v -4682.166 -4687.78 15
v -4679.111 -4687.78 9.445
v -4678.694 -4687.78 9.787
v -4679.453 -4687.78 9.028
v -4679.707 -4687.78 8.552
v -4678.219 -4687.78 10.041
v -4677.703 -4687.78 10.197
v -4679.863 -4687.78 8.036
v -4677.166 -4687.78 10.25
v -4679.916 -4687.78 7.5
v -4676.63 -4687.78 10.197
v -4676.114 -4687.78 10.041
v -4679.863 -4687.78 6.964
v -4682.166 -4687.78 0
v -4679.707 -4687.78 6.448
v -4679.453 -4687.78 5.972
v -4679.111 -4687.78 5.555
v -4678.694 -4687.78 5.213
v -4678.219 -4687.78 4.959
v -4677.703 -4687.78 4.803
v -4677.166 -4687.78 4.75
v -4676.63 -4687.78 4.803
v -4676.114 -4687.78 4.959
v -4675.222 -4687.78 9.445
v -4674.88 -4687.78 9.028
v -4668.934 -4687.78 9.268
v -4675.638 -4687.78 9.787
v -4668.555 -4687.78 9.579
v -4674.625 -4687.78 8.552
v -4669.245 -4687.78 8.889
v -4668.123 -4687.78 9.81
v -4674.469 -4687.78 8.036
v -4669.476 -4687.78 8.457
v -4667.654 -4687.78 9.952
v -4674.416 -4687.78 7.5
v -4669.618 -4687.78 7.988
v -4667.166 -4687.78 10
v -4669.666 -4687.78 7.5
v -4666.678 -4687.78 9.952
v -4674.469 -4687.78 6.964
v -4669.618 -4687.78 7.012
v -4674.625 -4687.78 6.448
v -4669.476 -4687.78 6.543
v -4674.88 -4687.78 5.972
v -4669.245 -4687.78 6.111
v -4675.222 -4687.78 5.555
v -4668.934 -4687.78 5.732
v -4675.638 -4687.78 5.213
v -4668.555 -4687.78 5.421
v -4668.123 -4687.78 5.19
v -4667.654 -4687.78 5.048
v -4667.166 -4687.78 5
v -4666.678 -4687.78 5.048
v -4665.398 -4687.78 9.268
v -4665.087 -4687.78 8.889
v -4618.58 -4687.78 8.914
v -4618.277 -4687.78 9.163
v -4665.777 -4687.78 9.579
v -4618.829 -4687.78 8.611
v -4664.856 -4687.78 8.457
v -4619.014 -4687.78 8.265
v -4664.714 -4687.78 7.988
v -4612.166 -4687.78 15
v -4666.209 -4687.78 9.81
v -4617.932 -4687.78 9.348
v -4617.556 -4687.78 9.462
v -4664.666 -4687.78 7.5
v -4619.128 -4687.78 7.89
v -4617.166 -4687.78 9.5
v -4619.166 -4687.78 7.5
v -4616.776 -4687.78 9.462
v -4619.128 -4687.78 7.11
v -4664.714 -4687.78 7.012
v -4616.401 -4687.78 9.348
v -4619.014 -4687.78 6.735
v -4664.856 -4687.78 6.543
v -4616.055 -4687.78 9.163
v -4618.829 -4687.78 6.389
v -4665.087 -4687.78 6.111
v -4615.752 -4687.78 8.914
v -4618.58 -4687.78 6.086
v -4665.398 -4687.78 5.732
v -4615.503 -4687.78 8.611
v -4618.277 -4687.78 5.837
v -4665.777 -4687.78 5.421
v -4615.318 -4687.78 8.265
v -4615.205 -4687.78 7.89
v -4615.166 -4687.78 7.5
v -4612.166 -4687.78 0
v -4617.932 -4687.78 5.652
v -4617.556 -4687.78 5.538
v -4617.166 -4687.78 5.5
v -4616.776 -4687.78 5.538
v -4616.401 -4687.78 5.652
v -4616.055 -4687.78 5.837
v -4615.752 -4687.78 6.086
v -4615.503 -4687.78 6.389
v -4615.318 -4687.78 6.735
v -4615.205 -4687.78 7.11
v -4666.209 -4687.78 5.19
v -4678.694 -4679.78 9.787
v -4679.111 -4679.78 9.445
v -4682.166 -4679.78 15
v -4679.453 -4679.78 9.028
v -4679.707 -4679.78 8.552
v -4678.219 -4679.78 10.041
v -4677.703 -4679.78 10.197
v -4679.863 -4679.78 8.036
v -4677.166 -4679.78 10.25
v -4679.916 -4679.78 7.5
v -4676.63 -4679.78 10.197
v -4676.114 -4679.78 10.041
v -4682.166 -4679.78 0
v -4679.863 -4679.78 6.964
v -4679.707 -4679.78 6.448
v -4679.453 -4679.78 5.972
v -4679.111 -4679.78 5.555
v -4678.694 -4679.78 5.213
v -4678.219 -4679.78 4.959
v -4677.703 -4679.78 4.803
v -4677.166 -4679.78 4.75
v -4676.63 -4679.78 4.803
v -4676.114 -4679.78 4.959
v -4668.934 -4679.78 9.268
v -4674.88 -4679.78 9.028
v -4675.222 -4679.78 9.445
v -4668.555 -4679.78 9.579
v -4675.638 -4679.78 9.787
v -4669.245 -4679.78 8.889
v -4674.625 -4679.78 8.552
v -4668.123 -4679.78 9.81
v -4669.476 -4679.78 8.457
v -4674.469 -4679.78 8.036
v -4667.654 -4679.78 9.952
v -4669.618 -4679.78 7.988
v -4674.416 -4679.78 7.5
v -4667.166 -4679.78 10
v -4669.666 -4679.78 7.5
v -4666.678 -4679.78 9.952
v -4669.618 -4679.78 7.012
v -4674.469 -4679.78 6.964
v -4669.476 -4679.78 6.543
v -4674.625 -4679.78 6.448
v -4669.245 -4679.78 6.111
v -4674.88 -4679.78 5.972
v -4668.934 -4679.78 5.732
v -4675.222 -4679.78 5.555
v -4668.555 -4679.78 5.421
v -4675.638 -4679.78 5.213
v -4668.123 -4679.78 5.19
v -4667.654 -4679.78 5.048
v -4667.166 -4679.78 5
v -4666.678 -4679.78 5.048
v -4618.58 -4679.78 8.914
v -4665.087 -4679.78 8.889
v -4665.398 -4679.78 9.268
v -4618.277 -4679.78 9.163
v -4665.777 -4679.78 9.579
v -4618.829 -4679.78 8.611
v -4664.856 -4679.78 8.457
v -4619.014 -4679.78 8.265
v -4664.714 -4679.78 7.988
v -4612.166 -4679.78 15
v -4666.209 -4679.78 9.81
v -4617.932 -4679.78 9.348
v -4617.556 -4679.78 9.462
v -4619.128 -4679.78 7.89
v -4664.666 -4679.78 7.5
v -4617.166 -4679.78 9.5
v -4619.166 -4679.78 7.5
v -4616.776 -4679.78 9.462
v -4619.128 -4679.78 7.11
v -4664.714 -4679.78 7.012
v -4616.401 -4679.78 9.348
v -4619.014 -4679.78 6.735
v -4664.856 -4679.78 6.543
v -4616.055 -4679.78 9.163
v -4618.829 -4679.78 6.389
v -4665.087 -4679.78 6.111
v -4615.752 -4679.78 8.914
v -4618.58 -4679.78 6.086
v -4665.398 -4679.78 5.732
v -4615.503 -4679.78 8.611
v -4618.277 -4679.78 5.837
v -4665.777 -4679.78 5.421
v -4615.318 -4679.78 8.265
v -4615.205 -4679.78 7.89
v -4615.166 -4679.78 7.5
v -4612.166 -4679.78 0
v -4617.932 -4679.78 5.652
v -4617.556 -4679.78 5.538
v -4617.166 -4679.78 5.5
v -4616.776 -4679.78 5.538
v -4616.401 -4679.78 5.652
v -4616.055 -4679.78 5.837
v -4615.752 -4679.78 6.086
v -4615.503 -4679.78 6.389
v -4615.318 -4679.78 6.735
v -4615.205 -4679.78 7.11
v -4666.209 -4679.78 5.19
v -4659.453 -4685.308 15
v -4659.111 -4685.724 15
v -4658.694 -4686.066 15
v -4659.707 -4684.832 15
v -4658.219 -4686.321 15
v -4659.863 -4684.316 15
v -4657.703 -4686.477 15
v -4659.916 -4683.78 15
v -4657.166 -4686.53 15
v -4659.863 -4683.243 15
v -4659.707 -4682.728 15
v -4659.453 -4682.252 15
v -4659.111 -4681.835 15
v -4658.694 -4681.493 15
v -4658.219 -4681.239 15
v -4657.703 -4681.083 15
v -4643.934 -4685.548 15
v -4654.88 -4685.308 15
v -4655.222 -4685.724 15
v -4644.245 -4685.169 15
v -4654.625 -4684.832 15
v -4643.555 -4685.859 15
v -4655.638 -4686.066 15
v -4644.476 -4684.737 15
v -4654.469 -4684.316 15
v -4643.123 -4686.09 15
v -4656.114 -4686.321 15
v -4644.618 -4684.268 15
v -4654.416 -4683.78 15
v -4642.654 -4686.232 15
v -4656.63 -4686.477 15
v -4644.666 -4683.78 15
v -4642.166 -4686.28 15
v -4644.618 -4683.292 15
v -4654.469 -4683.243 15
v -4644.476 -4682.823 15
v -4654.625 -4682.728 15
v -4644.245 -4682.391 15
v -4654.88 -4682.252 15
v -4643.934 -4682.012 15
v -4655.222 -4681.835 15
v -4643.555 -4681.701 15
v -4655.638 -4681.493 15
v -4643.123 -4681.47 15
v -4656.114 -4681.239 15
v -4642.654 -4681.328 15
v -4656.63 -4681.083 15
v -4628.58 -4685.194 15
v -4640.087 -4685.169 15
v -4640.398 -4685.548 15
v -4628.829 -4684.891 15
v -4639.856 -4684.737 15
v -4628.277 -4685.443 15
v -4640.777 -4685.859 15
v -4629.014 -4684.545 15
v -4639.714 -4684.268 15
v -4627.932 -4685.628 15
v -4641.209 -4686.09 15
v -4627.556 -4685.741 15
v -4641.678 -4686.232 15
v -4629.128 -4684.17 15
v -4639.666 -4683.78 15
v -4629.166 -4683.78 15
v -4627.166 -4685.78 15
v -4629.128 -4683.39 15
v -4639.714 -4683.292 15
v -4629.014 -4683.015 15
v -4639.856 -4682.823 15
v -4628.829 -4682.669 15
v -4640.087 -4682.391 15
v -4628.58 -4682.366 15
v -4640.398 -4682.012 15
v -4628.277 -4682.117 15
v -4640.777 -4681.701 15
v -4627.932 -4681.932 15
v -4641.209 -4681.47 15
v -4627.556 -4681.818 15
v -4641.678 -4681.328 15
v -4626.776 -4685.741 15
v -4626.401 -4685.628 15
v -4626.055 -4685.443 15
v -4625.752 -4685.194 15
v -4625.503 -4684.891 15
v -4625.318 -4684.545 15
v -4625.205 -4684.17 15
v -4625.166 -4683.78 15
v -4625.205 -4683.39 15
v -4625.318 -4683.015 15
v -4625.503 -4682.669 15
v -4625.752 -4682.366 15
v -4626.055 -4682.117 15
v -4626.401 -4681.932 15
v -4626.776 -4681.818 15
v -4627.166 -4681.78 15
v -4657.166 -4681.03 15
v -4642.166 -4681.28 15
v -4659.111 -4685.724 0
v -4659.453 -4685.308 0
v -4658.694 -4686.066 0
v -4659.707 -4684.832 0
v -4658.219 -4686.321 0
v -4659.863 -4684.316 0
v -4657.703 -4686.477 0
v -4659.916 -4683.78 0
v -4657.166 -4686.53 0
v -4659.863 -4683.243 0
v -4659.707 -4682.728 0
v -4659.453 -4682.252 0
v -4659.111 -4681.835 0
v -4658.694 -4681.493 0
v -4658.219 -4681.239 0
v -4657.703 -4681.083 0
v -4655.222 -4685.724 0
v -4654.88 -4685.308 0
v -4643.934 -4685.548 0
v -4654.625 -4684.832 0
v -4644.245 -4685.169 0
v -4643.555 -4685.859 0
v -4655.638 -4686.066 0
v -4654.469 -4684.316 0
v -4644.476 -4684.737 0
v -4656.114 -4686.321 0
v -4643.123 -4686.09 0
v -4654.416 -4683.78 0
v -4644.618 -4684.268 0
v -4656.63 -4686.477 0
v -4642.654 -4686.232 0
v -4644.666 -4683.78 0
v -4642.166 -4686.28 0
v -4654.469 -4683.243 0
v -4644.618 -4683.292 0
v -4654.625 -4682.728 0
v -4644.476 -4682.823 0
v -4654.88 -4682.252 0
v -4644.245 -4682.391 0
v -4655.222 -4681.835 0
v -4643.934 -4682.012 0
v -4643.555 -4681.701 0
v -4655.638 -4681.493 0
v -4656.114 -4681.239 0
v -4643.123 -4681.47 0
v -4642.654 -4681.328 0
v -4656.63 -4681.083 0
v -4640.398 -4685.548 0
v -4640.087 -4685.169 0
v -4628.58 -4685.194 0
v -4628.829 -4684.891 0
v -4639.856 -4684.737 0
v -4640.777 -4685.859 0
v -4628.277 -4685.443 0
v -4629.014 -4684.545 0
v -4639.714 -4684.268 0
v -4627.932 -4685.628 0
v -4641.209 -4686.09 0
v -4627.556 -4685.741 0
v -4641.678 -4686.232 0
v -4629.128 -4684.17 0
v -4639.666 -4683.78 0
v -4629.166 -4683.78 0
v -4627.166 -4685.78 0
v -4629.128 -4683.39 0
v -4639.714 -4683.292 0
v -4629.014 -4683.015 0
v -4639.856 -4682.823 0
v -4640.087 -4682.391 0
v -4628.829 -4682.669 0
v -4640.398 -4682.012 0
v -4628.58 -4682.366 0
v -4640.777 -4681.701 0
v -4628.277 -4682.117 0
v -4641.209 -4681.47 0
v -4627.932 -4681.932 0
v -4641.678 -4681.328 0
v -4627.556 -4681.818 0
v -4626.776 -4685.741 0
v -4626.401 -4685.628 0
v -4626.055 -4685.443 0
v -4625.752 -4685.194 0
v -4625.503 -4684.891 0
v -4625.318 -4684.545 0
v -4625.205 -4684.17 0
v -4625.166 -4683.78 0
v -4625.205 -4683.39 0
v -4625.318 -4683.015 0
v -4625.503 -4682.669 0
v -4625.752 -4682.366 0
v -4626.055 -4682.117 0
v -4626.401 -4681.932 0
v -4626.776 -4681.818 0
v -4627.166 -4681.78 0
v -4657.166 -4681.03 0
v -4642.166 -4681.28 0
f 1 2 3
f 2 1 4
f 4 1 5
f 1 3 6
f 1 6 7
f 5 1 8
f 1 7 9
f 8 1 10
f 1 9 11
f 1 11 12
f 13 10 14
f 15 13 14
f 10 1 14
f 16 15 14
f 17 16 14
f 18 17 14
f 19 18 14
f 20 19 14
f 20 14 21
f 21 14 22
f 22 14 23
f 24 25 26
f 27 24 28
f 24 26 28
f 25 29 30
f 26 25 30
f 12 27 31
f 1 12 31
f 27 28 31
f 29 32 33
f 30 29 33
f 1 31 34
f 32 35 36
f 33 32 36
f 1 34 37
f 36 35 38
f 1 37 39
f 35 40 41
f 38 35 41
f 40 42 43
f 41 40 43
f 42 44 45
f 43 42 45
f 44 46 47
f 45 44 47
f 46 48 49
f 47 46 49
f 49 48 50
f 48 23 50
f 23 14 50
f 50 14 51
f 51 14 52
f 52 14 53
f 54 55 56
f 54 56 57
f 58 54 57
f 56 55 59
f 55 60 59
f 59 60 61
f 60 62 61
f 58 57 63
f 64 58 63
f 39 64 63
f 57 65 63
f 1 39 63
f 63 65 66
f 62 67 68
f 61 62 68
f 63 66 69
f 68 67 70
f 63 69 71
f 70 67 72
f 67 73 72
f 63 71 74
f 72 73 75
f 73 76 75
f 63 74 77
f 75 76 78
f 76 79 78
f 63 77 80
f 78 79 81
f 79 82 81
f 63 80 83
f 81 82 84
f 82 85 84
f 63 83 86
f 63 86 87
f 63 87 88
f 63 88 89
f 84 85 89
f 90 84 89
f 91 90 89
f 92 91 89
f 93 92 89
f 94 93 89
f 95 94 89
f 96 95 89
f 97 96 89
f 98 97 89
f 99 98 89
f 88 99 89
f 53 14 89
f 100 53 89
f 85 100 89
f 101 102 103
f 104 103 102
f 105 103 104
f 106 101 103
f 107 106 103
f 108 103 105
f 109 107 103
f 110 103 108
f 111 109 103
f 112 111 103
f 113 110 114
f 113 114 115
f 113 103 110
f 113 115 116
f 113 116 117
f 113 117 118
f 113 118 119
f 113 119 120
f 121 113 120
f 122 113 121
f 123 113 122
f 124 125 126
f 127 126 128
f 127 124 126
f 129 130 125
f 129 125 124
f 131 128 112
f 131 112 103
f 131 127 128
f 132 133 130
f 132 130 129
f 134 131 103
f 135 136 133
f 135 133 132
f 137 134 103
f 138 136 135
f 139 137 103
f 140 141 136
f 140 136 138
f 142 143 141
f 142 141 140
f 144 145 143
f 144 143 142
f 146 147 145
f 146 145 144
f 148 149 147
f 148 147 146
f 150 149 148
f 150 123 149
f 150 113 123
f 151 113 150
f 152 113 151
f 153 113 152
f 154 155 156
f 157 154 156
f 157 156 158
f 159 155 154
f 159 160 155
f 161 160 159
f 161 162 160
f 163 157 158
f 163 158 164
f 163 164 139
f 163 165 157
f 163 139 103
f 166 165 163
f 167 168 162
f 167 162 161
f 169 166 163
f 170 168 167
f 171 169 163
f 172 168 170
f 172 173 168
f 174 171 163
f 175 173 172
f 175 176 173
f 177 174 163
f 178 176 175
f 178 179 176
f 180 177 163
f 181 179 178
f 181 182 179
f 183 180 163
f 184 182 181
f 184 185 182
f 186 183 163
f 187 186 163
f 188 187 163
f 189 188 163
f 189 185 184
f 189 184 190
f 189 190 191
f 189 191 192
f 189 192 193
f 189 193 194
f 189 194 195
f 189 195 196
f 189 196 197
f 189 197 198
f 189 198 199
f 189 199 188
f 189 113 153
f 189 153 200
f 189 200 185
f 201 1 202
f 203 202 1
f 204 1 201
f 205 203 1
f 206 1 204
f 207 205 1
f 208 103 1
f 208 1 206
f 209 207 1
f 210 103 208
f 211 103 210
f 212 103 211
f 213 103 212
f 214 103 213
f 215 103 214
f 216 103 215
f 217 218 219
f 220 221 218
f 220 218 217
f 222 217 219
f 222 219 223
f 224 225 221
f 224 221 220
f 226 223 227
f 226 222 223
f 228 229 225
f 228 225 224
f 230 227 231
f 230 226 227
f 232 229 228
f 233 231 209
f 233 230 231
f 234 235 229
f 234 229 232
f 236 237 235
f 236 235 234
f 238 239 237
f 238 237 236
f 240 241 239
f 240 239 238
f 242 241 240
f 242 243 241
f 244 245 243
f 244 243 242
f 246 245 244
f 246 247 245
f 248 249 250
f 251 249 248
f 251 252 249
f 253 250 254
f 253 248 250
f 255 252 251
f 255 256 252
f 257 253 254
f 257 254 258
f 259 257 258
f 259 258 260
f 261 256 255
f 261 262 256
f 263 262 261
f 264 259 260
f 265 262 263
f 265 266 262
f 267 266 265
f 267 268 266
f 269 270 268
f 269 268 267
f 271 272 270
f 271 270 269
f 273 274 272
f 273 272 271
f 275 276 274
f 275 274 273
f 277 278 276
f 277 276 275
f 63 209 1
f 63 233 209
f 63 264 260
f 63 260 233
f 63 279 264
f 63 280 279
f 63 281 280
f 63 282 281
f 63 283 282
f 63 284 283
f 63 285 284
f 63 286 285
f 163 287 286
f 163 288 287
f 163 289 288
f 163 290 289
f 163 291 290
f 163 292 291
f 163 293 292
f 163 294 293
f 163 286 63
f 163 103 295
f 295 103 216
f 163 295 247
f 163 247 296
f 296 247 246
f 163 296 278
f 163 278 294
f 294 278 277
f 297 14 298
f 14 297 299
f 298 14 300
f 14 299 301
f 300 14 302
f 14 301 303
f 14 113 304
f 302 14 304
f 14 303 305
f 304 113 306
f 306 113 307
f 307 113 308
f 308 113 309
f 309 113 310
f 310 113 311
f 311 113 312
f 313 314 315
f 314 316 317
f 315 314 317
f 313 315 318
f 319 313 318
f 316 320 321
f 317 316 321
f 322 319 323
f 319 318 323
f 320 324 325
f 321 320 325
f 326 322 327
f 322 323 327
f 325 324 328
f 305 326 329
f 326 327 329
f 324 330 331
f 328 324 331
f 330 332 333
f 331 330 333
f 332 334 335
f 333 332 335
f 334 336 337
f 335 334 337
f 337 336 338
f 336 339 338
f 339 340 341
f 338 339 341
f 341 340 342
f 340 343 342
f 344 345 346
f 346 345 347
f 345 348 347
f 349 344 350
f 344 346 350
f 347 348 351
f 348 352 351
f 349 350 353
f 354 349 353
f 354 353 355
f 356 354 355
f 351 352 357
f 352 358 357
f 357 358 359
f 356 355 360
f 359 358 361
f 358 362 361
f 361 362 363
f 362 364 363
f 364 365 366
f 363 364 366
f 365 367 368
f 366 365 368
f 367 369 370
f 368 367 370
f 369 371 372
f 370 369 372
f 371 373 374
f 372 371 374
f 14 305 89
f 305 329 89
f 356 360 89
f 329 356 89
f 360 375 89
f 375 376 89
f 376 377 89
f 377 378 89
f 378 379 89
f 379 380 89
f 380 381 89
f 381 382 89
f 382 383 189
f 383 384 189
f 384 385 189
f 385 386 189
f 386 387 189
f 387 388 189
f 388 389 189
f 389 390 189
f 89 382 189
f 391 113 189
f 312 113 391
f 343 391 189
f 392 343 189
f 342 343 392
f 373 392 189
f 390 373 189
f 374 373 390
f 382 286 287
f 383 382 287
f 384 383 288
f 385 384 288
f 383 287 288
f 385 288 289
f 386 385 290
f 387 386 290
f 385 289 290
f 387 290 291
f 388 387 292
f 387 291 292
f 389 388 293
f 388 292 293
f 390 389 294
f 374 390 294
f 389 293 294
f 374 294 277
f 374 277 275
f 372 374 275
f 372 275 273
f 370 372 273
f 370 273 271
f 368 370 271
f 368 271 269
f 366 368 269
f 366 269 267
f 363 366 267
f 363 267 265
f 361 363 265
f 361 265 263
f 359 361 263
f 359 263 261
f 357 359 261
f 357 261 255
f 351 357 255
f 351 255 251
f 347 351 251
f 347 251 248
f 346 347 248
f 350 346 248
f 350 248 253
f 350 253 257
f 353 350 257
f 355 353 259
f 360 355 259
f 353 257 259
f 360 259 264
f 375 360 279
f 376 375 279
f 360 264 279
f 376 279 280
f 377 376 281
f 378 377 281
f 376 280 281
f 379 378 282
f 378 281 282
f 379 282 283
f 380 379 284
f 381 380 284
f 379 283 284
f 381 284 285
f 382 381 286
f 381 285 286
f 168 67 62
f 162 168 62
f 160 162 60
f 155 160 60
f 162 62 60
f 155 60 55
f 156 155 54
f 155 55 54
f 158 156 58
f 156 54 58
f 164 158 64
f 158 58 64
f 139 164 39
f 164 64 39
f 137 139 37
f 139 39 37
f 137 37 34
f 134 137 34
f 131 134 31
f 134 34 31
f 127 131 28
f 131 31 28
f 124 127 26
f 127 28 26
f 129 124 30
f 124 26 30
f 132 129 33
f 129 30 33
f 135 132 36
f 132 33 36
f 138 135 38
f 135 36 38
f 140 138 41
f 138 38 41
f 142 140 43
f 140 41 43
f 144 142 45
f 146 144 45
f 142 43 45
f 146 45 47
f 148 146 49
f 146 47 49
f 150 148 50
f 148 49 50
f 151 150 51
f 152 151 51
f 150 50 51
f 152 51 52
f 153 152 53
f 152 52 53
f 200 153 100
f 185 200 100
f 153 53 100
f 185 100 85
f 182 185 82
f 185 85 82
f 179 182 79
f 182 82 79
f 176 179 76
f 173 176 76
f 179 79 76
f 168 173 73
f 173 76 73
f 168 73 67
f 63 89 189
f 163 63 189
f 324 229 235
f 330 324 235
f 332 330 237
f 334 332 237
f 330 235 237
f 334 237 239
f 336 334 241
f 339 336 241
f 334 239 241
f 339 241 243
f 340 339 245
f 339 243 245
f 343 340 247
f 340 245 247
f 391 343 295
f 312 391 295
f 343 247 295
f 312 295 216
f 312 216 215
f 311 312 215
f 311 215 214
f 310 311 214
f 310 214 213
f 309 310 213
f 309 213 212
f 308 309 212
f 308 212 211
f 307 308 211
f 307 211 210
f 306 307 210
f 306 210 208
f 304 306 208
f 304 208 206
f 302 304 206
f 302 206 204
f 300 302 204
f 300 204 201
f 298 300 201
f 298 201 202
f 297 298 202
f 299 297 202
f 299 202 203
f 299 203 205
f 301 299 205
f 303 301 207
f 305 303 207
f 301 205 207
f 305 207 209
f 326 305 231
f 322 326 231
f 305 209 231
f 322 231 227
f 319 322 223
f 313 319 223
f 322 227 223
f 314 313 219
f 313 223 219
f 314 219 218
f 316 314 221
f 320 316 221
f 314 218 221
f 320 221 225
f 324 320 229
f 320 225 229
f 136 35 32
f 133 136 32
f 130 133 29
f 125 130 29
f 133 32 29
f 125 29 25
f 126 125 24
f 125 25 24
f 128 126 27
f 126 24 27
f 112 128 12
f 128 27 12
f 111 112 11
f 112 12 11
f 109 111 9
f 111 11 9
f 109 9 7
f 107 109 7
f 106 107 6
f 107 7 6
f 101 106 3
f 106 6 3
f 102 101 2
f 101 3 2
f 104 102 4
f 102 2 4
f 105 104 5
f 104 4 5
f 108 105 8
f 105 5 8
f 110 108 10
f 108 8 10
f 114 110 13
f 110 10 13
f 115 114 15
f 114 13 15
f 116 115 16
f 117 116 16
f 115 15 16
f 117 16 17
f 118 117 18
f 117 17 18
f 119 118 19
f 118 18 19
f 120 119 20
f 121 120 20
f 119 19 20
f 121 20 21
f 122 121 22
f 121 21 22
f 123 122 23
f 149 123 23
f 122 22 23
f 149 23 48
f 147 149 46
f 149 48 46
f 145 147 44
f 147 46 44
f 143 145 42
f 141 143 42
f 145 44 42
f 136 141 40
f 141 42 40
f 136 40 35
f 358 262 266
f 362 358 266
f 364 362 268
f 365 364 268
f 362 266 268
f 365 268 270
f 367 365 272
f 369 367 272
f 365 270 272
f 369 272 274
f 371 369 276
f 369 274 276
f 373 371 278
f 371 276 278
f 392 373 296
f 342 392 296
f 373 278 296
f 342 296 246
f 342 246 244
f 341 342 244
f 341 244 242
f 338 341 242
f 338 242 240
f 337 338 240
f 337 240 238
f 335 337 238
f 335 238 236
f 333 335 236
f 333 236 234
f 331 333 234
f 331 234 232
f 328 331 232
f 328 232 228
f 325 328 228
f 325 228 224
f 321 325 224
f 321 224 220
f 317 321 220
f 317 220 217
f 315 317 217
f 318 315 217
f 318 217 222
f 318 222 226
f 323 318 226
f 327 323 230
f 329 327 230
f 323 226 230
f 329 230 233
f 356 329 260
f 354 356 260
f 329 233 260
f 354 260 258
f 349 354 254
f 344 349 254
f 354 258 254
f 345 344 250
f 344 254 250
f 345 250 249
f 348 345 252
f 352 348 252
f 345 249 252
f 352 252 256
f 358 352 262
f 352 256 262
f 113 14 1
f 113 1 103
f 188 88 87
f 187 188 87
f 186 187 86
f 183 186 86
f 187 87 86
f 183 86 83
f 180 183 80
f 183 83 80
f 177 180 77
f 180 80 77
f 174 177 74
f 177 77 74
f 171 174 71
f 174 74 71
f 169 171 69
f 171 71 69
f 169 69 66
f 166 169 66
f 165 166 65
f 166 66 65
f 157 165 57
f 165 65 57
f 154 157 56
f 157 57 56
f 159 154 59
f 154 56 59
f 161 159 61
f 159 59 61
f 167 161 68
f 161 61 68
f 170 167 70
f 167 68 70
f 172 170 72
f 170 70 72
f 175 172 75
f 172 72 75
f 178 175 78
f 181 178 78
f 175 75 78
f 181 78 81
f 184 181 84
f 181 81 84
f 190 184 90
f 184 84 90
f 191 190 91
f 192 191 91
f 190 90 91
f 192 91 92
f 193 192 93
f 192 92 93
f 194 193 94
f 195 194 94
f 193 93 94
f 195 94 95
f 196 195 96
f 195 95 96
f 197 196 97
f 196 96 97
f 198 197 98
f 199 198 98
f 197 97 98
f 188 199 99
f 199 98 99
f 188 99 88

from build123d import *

# Parameters (mm, degrees)
F0_W     = 70
F0_H     = 8
F1_DEPTH = 15
F2_R     = 2.75
F2_R_2   = 2
F2_R_3   = 2.5
F3_DEPTH = 8
F4_R     = 2.75
F4_R_2   = 2.5
F4_R_3   = 2
F5_DEPTH = 25


with BuildPart() as f1:
    # F0 (on Top) → F1 (new body)
    with BuildSketch(Plane.XY):
        with Locations((-4647.166157, -4683.779903)):
            Rectangle(F0_W, F0_H)
    extrude(amount=F1_DEPTH)

    # F2 (on face) → F3 (cut)
    with BuildSketch(Plane.XZ.offset(4687.779903)):
        with Locations((-4677.166157, 7.5)):
            Circle(F2_R)
        with Locations((-4617.166157, 7.5)):
            Circle(F2_R_2)
        with Locations((-4667.166157, 7.5)):
            Circle(F2_R_3)
    extrude(amount=-F3_DEPTH, mode=Mode.SUBTRACT)

    # F4 (on face) → F5 (cut)
    with BuildSketch(Plane.XY.offset(15)):
        with Locations((-4657.166157, -4683.779903)):
            Circle(F4_R)
        with Locations((-4642.166157, -4683.779903)):
            Circle(F4_R_2)
        with Locations((-4627.166157, -4683.779903)):
            Circle(F4_R_3)
    extrude(amount=-F5_DEPTH, mode=Mode.SUBTRACT)


solid = f1.part
